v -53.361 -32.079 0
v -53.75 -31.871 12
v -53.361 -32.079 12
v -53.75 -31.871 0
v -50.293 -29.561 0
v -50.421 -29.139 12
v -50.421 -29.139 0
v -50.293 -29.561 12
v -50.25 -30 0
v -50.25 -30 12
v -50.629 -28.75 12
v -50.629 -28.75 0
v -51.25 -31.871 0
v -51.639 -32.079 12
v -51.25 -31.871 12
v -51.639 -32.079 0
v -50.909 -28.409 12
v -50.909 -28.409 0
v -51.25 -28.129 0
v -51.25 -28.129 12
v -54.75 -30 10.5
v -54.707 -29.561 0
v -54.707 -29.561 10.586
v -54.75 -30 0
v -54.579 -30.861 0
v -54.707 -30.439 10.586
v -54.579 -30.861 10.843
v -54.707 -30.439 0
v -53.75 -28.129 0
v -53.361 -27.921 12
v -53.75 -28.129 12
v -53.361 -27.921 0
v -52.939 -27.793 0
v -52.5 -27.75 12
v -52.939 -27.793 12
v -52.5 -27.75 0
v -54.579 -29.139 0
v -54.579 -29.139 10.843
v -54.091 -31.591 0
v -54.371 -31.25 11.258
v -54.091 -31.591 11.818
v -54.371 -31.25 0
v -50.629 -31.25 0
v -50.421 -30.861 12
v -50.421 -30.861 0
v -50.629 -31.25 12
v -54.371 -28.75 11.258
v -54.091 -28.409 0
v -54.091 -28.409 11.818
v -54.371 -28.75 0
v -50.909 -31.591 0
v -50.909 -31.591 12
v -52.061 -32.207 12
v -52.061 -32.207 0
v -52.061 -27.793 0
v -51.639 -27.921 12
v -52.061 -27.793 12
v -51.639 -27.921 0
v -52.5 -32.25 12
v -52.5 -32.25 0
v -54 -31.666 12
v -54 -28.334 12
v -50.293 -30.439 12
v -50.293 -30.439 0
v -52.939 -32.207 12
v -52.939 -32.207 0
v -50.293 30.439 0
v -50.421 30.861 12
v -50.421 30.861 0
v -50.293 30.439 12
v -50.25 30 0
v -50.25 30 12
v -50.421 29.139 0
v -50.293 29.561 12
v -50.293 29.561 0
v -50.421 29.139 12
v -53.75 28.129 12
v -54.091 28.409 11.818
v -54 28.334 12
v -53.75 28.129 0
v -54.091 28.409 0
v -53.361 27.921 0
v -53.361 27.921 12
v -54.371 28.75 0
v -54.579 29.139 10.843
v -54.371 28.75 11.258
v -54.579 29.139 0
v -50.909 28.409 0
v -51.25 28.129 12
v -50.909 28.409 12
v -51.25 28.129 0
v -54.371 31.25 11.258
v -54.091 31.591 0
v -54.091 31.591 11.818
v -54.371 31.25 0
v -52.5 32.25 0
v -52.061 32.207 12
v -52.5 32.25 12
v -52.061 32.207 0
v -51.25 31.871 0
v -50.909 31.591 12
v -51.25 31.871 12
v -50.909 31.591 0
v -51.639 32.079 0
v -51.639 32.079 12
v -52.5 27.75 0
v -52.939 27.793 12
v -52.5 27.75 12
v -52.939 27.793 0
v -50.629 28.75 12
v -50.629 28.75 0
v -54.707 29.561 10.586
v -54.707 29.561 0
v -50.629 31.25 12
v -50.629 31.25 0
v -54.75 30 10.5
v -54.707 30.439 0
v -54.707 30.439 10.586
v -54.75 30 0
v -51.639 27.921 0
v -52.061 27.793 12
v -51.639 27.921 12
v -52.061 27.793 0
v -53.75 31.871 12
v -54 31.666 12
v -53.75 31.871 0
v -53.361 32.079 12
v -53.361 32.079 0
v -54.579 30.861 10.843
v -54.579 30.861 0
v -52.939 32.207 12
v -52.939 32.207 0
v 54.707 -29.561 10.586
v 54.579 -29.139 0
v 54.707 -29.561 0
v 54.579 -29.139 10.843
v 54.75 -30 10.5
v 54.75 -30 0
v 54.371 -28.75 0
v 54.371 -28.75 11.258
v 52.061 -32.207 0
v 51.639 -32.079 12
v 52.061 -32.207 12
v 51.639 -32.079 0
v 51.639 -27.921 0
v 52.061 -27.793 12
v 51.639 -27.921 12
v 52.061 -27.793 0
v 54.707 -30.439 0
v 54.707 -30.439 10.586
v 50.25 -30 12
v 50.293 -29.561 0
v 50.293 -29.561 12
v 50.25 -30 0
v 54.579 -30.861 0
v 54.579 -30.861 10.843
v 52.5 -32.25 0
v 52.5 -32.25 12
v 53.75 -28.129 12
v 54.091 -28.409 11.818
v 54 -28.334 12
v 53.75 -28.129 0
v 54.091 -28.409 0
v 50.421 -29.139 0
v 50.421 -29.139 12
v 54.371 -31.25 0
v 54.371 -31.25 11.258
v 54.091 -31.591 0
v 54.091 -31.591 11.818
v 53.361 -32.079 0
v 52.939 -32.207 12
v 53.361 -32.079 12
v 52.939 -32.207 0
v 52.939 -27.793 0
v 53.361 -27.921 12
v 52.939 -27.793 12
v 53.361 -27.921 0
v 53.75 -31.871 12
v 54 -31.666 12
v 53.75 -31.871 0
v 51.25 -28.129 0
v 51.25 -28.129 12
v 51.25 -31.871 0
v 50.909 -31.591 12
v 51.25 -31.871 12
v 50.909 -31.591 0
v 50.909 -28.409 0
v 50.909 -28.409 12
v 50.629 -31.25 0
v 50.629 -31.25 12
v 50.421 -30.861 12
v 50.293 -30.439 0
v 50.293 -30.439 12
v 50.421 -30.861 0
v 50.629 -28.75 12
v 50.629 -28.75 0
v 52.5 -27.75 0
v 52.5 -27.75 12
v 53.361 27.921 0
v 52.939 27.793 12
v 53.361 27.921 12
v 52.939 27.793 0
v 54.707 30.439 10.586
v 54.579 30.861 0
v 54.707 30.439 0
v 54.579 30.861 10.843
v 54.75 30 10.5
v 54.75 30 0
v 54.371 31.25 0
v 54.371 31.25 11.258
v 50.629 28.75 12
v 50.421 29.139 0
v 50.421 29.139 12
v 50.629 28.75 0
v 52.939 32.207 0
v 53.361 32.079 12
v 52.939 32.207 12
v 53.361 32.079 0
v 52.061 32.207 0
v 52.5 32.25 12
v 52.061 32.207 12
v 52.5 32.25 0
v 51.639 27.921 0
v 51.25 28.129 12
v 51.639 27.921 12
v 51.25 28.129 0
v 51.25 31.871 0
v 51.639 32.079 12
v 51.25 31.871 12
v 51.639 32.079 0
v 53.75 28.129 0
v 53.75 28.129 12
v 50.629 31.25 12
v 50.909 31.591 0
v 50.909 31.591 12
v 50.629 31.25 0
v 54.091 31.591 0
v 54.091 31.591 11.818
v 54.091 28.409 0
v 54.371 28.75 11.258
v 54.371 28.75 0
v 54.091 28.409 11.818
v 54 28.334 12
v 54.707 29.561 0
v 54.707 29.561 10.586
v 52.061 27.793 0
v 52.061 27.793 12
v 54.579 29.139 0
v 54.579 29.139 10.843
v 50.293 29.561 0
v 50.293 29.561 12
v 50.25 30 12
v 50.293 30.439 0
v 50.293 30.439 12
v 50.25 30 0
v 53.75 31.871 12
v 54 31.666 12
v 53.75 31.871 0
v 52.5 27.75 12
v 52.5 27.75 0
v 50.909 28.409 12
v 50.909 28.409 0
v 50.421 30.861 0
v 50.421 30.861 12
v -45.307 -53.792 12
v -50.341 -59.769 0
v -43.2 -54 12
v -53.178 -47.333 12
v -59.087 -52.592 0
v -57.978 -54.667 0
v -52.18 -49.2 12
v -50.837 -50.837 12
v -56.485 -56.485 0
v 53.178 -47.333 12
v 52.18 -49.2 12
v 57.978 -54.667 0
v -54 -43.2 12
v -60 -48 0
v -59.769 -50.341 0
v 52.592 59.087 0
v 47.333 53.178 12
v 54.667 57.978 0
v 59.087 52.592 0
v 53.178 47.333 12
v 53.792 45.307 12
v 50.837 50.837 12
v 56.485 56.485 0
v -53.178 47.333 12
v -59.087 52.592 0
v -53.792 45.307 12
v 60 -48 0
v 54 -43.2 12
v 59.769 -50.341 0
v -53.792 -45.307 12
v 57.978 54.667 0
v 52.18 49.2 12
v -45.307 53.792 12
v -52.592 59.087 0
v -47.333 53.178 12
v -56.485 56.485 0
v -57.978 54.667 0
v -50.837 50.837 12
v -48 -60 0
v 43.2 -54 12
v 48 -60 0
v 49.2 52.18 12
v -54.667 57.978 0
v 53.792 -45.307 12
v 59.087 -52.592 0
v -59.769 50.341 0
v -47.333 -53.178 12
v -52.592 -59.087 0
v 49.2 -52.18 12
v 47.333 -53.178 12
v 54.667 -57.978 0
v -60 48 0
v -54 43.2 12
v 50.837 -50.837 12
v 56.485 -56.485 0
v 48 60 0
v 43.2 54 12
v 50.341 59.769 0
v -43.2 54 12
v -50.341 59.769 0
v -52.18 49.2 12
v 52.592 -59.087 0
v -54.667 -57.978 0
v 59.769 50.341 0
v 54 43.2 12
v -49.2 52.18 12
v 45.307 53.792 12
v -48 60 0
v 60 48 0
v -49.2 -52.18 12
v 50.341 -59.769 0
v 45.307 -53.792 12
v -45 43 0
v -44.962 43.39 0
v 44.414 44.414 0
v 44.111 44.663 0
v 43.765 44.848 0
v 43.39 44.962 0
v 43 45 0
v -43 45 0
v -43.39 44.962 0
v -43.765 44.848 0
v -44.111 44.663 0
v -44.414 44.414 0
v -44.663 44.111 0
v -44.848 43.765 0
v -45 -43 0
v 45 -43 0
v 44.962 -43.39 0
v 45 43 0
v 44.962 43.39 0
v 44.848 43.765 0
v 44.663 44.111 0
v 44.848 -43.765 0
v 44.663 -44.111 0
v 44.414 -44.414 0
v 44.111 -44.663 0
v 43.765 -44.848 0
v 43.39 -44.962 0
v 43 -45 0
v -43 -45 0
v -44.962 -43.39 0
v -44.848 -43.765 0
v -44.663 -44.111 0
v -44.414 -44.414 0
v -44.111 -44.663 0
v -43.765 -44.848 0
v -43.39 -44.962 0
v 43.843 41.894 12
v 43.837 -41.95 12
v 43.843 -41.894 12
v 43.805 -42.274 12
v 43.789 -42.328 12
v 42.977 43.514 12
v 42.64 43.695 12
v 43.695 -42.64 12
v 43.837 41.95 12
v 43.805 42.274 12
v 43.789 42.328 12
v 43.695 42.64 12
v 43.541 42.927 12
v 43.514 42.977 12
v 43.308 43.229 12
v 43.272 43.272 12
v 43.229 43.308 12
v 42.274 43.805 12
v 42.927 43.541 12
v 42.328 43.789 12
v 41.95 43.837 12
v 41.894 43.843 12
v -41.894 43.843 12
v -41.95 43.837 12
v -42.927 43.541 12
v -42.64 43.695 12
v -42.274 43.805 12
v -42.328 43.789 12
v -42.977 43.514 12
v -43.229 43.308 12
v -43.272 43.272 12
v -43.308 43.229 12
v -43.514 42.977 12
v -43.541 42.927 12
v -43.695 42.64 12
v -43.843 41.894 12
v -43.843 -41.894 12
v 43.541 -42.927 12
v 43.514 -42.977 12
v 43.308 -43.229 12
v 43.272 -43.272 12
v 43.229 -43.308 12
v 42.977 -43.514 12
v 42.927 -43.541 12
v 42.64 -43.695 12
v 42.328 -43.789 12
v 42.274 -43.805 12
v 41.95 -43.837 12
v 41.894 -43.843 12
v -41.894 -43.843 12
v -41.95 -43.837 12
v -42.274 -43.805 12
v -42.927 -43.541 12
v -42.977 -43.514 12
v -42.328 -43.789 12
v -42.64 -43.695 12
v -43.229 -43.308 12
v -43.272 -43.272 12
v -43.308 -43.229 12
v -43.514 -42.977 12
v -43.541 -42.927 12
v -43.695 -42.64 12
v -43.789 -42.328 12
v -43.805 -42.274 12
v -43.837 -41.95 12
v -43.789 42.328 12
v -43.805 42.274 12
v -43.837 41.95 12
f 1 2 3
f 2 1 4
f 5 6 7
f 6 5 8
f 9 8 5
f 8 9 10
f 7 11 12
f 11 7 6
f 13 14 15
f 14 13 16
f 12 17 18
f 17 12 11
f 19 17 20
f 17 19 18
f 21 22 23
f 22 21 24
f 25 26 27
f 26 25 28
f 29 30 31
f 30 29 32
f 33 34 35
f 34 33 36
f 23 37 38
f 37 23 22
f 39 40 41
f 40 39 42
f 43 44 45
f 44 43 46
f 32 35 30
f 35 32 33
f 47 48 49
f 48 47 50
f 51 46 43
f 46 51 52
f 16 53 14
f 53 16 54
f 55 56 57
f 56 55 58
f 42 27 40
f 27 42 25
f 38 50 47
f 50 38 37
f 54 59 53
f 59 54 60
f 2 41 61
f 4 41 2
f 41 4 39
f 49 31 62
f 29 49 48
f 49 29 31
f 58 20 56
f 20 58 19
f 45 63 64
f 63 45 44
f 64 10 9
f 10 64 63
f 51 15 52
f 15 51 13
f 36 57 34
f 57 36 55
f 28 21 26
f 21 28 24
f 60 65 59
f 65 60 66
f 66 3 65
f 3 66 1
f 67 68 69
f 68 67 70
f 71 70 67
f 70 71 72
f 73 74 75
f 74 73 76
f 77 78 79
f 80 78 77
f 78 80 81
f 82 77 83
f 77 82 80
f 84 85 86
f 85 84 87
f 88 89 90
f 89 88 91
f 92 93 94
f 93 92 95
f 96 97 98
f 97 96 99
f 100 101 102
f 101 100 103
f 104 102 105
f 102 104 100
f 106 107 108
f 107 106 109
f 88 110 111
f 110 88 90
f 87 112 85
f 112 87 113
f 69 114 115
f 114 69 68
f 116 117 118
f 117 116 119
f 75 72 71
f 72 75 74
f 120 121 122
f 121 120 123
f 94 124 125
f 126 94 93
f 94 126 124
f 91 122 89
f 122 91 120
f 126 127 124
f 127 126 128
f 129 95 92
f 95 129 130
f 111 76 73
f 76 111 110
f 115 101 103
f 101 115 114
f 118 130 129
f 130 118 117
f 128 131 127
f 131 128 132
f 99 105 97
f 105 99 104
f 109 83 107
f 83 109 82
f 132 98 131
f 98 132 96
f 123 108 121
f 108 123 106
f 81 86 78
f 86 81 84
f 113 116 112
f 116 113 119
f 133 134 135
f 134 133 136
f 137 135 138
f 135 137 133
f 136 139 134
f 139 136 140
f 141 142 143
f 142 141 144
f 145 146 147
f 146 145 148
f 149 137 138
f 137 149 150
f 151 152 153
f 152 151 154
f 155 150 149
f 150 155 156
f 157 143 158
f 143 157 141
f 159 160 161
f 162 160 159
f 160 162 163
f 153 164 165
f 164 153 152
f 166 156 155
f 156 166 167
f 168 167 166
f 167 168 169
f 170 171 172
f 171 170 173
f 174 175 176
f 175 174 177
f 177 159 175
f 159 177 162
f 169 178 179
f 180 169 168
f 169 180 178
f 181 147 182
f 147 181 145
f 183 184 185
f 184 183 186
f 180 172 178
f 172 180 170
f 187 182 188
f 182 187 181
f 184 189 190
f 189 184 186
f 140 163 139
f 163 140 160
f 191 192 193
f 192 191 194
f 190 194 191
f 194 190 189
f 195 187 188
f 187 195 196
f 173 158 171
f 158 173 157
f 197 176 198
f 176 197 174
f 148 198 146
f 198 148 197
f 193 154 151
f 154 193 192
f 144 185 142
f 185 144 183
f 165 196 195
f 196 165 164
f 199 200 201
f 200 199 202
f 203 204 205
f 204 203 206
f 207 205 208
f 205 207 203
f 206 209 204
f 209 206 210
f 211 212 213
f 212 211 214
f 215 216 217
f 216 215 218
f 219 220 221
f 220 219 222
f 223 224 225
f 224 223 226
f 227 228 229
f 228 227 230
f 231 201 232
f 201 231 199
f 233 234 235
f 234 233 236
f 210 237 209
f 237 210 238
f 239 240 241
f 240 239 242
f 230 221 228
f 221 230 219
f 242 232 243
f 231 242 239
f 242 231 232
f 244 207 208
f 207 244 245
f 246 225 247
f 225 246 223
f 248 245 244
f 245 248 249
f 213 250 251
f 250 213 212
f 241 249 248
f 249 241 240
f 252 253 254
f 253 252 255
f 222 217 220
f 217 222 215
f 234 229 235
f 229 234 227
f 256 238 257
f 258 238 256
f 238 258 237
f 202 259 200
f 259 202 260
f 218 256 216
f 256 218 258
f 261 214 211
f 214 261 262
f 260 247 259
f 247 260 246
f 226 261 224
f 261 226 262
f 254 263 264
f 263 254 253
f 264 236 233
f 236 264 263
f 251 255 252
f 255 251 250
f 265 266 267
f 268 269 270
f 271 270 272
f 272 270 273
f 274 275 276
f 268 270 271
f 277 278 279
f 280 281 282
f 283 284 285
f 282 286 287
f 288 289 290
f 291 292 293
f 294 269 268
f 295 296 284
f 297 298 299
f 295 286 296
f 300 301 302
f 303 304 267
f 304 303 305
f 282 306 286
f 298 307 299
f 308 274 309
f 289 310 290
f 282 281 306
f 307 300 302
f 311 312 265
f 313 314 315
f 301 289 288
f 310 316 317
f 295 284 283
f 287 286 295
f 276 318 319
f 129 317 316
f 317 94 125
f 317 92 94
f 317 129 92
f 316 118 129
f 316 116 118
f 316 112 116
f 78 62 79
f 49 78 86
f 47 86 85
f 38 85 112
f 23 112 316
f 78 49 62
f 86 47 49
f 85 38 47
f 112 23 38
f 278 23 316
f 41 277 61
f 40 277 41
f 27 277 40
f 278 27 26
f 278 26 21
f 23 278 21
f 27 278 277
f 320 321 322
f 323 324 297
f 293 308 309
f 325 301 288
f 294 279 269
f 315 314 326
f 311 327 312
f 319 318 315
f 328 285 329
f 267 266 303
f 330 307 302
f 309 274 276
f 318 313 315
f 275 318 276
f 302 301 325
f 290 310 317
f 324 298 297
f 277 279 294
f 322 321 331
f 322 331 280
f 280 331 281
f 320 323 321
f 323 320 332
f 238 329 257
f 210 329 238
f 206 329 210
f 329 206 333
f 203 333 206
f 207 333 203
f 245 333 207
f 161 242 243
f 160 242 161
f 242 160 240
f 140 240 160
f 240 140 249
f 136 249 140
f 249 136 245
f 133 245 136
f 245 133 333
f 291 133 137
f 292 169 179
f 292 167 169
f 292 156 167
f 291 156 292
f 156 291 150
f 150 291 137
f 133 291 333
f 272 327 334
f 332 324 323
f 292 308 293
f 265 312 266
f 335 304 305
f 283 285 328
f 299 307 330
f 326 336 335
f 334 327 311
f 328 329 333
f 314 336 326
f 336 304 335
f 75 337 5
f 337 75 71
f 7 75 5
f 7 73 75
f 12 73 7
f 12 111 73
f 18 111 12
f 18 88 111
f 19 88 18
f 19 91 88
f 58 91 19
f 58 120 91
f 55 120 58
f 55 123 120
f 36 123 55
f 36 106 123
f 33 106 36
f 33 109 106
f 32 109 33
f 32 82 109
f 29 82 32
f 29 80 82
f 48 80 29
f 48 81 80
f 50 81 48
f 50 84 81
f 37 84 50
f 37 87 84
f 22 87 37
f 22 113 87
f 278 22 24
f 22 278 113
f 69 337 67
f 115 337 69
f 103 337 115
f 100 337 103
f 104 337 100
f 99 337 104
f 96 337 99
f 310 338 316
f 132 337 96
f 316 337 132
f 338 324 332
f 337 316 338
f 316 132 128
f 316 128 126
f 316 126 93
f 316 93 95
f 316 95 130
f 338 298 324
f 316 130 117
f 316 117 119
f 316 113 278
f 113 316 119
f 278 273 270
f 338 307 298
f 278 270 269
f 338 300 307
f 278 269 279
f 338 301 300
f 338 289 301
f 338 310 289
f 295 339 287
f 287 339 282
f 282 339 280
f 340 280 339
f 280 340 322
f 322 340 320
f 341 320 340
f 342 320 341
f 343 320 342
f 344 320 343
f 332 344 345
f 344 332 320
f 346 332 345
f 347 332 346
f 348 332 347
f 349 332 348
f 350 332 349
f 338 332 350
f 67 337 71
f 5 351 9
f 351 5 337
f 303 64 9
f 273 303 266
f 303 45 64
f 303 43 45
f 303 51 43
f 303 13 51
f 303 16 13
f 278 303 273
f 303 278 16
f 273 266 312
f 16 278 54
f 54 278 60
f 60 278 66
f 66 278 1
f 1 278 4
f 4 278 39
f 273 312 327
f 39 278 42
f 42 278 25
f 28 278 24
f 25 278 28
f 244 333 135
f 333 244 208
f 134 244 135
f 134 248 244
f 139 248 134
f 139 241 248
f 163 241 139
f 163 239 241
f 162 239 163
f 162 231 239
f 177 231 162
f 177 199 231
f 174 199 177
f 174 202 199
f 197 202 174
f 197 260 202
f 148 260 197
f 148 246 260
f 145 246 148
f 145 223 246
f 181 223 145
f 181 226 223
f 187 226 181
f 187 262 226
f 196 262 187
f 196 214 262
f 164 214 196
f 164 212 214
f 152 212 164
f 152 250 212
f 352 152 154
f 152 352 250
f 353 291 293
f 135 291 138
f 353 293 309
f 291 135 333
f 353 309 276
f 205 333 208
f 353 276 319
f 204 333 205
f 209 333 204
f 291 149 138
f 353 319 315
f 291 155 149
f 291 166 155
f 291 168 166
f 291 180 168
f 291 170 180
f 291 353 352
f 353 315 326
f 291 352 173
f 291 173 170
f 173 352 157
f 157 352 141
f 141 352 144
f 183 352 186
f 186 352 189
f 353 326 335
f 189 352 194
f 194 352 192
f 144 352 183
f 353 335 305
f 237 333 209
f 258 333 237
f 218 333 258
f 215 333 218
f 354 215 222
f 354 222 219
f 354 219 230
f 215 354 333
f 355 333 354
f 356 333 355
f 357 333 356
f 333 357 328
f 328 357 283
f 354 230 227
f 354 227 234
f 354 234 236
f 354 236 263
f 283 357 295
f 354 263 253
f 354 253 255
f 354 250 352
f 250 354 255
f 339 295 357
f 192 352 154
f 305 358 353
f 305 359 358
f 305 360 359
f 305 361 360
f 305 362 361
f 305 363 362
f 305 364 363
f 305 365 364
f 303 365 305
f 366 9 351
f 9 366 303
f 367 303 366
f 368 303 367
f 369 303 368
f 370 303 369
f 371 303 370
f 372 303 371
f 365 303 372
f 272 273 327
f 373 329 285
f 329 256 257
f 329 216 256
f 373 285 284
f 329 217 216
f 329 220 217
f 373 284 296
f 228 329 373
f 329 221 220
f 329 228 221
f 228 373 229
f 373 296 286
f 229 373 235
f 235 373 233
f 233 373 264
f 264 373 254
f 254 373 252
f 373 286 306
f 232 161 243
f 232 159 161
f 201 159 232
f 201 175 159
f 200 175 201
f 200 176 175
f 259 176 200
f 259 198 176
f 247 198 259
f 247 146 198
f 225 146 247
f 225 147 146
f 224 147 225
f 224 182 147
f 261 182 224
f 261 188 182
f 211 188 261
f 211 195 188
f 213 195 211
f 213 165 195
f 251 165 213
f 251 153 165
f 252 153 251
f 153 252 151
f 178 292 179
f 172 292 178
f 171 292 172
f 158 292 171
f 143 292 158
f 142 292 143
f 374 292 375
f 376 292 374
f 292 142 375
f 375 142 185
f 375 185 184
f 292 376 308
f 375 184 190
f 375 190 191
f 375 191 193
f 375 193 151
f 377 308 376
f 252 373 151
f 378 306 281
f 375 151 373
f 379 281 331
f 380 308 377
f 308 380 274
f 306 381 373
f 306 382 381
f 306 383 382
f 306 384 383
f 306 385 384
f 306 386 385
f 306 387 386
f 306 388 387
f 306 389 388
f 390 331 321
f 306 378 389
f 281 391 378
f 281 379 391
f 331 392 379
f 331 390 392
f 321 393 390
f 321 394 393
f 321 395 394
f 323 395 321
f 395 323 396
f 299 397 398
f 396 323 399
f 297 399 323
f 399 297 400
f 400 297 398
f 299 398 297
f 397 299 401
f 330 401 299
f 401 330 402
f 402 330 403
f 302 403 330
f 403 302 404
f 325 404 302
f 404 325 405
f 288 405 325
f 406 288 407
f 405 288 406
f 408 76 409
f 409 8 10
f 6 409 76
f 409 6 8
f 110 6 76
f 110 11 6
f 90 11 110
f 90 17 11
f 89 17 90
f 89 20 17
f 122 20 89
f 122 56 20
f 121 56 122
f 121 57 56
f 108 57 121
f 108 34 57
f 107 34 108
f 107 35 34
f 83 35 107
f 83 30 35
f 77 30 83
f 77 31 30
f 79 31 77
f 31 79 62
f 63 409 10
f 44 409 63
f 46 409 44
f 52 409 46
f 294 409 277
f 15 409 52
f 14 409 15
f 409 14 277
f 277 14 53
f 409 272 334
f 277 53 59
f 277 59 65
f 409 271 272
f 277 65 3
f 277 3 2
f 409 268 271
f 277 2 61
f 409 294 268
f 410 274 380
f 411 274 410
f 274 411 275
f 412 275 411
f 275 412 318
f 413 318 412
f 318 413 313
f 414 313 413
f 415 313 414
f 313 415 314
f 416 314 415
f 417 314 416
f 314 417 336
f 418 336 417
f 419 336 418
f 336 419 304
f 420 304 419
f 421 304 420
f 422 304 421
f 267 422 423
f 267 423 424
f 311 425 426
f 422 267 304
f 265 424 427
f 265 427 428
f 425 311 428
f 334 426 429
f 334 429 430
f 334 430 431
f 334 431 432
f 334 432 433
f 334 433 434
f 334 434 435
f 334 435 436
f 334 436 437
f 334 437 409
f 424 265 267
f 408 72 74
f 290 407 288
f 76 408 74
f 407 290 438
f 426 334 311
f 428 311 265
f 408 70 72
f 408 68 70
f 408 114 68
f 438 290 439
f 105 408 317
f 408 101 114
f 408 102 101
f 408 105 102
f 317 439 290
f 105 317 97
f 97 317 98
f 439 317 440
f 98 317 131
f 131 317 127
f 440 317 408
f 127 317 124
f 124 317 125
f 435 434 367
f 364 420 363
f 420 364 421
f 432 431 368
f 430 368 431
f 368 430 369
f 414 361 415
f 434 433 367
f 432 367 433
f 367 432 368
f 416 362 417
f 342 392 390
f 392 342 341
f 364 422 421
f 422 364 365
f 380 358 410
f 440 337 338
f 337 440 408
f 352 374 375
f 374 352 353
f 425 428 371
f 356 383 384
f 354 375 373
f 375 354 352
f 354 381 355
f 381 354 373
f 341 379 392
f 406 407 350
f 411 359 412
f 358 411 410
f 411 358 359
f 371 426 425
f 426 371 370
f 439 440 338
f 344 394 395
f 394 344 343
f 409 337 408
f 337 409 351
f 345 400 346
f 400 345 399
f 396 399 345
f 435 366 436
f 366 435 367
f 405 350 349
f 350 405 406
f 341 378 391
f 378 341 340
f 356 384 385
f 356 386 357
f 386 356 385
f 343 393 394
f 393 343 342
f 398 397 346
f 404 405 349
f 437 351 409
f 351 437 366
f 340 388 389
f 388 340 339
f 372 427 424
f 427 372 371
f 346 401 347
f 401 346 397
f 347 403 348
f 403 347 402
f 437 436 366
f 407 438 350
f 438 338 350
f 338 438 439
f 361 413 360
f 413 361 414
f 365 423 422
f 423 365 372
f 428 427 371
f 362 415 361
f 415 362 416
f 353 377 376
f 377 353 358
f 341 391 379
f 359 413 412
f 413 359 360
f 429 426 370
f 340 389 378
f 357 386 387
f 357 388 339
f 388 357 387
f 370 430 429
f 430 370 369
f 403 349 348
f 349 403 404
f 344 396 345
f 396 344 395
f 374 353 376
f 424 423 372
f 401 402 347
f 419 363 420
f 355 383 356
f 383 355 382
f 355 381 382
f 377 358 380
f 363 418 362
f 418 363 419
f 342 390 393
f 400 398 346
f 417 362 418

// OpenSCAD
$fn = 32;

// ----------------------------------------------------------------------
// Display bezel: 120 x 120 mm frame, opening 90x90 mm
// ----------------------------------------------------------------------

// --- parameters (mm) ---
length = 120;             // frame outside length, X
width = 120;              // frame outside width, Y
frame_w = 15;             // frame width
thickness = 12;           // frame thickness
corner_r = 12;            // outside corner radius
chamfer = 0.9;            // outer wall taper
funnel = 0.97;            // inner opening taper
opening_l = 90;           // opening length
opening_w = 90;           // opening width
inner_r = 2;              // opening corner radius
hole_d = 4.5;             // mounting screw clearance
holes_per_side = 2;       // holes per short side
hole_inset = 7.5;         // hole centre inset from the outside edge

/* rounded-rectangle outlines, generated with loops */
module rounded_ring(l_nom, w_nom, r) {
  hull() {
    for (sx = [-1, 1]) for (sy = [-1, 1])
      translate([sx * (l_nom / 2 - r), sy * (w_nom / 2 - r)]) circle(r = r);
  }
}

difference() {
  /* frame body, drafted so the outer edge is a variable-depth chamfer */
  linear_extrude(height = thickness, scale = chamfer)
    rounded_ring(length, width, corner_r);
  /* viewing opening, drafted the other way for a funnel edge */
  linear_extrude(height = thickness + 2, scale = funnel)
    translate([0, 0, -1]) rounded_ring(opening_l, opening_w, inner_r);
  /* mounting screws through the frame lands */
  for (sx = [-1, 1]) for (i = [1 : holes_per_side])
    translate([sx * (length / 2 - hole_inset),
               (i - (holes_per_side + 1) / 2) * width * 0.5, -1])
      cylinder(h = thickness + 2, d = hole_d);
}
